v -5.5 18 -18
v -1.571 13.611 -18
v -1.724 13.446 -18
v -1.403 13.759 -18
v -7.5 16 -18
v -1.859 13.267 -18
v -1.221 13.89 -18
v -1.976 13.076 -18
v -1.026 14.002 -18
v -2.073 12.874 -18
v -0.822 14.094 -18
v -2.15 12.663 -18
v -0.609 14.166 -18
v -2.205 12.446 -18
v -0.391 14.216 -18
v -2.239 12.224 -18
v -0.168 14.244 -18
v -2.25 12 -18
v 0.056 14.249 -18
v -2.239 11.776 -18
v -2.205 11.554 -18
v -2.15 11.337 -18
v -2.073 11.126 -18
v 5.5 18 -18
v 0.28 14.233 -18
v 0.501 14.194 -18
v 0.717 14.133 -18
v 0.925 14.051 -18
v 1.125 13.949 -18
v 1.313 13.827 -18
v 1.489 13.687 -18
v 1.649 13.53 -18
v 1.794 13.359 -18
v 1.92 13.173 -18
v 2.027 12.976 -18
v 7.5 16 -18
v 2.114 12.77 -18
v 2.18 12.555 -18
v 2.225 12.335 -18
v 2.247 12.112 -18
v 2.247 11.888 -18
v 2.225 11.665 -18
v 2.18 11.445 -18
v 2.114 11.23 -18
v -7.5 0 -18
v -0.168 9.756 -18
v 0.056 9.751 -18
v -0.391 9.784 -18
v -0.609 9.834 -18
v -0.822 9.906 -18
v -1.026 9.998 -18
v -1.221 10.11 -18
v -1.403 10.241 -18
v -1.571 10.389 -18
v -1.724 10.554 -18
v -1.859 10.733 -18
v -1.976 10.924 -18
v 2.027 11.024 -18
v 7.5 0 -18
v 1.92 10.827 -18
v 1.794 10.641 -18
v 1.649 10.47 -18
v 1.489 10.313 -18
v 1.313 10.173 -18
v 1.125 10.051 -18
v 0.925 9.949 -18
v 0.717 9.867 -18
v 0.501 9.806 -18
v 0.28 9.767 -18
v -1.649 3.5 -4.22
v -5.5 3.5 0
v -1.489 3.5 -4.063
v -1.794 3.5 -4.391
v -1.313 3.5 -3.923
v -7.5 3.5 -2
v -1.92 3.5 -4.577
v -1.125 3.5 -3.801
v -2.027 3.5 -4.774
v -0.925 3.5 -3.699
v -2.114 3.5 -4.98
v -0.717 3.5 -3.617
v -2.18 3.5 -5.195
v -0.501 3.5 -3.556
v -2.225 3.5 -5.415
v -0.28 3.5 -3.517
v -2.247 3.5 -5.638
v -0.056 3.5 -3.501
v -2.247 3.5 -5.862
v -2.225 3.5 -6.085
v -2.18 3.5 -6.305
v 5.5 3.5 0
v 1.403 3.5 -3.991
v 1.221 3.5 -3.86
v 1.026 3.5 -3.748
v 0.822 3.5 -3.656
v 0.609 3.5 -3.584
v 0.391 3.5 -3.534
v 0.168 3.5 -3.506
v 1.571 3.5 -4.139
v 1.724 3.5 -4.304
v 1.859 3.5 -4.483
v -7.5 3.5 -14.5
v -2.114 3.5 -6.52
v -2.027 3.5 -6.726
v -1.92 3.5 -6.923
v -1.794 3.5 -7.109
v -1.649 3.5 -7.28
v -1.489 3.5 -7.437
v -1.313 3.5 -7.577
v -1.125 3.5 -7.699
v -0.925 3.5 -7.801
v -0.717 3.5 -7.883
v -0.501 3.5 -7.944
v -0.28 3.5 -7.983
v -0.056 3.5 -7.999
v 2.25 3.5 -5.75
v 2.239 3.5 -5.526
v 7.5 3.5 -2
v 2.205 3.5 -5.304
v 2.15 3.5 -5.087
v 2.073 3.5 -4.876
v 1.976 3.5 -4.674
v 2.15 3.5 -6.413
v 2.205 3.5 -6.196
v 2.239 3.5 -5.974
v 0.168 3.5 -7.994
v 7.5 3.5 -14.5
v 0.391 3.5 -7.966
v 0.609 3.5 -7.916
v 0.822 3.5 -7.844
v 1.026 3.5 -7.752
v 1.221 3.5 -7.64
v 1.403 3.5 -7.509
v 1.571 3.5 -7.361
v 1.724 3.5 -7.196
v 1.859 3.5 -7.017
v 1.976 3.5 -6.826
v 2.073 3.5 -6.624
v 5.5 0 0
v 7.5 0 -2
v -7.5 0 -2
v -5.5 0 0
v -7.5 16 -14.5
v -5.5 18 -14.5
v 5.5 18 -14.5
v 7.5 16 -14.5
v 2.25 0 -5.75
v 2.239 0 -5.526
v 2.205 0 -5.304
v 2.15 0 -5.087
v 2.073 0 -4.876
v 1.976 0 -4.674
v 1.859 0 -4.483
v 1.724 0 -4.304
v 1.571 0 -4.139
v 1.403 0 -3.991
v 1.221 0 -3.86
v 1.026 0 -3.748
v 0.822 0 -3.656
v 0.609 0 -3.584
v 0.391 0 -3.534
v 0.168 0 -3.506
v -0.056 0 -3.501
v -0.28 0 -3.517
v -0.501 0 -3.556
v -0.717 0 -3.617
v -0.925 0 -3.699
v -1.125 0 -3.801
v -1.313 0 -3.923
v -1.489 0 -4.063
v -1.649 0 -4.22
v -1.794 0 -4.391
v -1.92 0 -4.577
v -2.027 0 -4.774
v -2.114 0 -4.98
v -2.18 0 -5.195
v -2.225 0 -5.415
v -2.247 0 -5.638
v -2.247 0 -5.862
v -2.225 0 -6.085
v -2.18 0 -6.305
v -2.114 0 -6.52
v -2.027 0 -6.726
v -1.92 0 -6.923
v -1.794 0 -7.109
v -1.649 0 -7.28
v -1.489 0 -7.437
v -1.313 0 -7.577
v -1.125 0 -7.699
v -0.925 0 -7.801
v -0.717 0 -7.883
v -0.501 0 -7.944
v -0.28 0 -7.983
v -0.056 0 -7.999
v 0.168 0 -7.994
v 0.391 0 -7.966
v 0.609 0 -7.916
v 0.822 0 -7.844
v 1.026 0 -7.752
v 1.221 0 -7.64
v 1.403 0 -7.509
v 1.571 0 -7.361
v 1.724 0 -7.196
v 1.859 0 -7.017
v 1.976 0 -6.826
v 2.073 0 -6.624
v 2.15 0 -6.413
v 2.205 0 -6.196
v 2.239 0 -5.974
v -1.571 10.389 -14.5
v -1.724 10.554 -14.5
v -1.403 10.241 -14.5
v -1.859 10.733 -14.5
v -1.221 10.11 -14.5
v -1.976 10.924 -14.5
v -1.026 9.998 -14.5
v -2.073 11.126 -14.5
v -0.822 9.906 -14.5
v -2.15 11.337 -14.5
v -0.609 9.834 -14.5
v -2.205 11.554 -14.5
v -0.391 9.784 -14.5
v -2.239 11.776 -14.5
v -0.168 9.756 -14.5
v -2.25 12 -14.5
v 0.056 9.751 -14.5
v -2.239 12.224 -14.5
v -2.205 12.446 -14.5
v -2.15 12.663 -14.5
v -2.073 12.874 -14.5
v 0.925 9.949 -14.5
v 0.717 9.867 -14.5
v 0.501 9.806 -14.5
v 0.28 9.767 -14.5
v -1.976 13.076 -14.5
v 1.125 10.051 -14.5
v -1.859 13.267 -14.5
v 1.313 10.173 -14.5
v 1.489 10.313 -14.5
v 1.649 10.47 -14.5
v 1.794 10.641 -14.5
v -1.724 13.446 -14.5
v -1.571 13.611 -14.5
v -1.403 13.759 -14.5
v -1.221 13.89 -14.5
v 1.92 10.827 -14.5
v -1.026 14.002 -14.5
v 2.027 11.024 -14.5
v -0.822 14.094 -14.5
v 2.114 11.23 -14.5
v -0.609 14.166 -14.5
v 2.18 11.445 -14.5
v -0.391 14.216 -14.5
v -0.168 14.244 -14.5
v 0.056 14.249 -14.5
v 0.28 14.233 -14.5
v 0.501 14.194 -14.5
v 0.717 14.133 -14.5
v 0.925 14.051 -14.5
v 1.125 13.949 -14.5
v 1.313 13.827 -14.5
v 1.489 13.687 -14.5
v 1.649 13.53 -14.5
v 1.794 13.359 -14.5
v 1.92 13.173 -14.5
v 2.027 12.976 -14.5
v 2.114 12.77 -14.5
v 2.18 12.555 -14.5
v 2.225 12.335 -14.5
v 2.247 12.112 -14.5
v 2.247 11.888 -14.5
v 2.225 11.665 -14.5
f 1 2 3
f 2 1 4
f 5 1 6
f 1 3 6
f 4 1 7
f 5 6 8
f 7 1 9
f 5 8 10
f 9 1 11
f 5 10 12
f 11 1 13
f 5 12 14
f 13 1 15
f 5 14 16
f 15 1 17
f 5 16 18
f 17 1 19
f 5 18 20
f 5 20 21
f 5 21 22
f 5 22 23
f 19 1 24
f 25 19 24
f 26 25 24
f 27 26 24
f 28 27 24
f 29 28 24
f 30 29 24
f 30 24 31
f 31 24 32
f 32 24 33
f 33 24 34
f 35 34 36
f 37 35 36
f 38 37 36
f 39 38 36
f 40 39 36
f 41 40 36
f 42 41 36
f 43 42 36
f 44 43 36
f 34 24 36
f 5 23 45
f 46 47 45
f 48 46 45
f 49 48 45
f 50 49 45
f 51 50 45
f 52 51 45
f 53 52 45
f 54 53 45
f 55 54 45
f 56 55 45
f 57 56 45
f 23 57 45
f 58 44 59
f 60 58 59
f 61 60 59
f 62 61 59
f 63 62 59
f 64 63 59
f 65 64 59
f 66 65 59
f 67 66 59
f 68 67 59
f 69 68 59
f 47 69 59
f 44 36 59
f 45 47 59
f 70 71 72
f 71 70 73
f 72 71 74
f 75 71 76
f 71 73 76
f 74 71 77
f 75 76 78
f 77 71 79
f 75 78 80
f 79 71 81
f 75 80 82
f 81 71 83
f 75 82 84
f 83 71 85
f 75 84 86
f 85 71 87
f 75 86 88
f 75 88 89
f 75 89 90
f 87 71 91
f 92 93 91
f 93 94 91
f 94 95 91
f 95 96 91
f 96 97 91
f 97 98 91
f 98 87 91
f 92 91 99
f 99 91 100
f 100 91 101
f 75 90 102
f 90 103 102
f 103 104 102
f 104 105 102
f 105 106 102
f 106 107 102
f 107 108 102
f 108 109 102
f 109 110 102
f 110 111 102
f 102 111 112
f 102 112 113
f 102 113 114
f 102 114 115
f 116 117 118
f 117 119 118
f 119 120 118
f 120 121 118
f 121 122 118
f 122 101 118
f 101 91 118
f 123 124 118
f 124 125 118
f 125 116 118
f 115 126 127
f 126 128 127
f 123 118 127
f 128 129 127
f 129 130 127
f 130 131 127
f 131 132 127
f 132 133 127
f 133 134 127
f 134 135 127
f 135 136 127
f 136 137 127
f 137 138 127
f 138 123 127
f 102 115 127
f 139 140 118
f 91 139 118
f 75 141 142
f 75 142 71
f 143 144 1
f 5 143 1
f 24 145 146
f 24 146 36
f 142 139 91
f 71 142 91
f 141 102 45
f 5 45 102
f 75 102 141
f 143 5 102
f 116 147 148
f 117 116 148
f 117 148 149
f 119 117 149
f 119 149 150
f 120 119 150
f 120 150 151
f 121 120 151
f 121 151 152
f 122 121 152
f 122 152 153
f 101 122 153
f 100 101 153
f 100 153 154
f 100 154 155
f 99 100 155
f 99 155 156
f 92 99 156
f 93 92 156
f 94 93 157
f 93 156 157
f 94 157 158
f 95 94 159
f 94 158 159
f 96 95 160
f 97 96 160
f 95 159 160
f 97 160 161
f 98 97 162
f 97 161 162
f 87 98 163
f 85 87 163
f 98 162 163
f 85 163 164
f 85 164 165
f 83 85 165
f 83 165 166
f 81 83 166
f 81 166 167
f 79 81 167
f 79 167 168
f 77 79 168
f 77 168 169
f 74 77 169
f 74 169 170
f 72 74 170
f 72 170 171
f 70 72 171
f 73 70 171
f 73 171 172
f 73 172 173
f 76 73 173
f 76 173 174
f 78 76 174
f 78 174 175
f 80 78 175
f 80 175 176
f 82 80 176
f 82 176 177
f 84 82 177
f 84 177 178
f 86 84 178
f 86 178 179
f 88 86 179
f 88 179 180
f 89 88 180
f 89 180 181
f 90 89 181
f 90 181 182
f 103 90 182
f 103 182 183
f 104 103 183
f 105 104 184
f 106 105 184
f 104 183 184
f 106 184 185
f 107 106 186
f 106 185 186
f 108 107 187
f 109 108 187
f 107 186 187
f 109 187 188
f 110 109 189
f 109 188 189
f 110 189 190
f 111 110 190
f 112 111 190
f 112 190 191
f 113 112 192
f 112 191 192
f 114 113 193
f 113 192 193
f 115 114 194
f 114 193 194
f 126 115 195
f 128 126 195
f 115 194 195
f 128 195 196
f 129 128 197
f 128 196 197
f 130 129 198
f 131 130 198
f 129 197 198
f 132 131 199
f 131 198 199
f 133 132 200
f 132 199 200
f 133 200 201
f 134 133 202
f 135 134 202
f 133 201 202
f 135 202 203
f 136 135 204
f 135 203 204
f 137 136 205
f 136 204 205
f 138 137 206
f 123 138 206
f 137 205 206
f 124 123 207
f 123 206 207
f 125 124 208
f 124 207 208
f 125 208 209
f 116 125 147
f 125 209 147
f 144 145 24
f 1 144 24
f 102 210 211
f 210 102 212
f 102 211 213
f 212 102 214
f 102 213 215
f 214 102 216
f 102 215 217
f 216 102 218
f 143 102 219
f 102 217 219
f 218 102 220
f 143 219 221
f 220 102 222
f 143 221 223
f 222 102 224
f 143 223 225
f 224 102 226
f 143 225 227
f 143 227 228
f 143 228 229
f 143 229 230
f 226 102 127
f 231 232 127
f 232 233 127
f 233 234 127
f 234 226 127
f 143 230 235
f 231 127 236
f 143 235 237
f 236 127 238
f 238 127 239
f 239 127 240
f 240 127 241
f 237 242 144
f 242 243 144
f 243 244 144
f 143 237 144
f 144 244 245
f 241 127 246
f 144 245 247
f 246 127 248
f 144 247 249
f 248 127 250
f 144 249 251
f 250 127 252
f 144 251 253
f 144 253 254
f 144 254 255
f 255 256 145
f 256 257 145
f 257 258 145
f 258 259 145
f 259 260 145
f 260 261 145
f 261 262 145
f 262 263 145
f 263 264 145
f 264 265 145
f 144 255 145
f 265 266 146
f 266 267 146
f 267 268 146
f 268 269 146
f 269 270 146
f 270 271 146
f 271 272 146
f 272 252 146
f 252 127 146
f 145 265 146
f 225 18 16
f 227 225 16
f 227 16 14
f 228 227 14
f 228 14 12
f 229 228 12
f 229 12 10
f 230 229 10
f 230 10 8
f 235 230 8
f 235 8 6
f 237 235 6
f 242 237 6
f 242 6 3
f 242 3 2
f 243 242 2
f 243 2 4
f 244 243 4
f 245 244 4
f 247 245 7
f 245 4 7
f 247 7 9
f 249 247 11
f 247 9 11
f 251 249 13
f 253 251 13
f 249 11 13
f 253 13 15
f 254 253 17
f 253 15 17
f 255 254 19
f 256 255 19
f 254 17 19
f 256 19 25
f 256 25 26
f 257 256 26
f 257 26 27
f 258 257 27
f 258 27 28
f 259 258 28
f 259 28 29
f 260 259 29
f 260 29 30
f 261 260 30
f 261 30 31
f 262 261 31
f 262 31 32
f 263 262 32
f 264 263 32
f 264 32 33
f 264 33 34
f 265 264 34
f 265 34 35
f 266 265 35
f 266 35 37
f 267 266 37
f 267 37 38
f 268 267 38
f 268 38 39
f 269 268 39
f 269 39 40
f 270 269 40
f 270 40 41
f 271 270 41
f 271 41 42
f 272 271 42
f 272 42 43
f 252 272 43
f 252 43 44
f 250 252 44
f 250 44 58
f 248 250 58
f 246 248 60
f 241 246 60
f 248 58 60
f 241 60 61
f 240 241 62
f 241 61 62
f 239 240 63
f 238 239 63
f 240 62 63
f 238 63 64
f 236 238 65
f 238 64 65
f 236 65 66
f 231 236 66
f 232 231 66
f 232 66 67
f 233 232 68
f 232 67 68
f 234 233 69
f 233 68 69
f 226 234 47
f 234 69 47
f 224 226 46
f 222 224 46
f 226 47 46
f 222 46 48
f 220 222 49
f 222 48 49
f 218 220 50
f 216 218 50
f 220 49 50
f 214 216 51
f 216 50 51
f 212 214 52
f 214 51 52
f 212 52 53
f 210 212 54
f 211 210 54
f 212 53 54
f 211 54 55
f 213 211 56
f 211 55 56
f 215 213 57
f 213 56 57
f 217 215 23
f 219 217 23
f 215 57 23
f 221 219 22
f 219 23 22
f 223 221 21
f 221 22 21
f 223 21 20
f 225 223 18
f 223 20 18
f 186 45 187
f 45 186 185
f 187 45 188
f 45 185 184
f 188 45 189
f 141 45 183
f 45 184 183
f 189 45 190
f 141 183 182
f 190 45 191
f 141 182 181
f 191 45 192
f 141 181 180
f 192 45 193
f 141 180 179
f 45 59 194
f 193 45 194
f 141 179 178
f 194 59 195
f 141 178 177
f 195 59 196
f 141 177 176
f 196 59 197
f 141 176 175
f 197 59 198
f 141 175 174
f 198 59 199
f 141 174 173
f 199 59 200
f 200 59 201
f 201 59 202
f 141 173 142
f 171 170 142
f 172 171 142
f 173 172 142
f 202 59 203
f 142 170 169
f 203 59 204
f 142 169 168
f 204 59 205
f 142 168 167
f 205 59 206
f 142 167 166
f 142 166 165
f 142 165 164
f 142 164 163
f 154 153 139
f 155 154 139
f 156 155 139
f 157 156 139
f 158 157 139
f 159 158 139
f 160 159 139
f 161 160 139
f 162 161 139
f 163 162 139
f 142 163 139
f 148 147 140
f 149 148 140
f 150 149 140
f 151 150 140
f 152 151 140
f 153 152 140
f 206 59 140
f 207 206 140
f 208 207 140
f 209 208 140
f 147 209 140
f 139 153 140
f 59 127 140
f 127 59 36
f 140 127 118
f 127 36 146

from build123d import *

# Parameters (mm, degrees)
SALIENTE_EXTRUIR1_DEPTH = 7.5
CROQUIS2_R              = 2.25
CORTAR_EXTRUIR1_DEPTH   = 15
CROQUIS3_R              = 2.25
CORTAR_EXTRUIR2_DEPTH   = 15
CHAFL_N1_SIZE           = 2


with BuildPart() as part:
    # Croquis1 → Saliente-Extruir1 (new body, symmetric)
    with BuildSketch(Plane(origin=(0, 0, 0), x_dir=(0, 0, -1), z_dir=(1, 0, 0))):
        Polygon((0, 0), (0, 3.5), (14.5, 3.5), (14.5, 18), (18, 18), (18, 0), align=None)
    extrude(amount=SALIENTE_EXTRUIR1_DEPTH, both=True)

    # Croquis2 → Cortar-Extruir1 (cut)
    with BuildSketch(Plane.XZ):
        with Locations((0, -5.75)):
            Circle(CROQUIS2_R)
    extrude(amount=-CORTAR_EXTRUIR1_DEPTH, mode=Mode.SUBTRACT)

    # Croquis3 → Cortar-Extruir2 (cut)
    with BuildSketch(Plane(origin=(0, 0, -18), x_dir=(-1, 0, 0), z_dir=(0, 0, -1))):
        with Locations((0, 12)):
            Circle(CROQUIS3_R)
    extrude(amount=-CORTAR_EXTRUIR2_DEPTH, mode=Mode.SUBTRACT)

    # Chaflán1
    chafl_n1_edges = [part.edges().sort_by_distance(p)[0] for p in [
        (7.5, 18, -16.25),
        (7.5, 1.75, 0),
        (-7.5, 1.75, 0),
        (-7.5, 18, -16.25),
    ]]
    chamfer(chafl_n1_edges, length=CHAFL_N1_SIZE)


solid = part.part
